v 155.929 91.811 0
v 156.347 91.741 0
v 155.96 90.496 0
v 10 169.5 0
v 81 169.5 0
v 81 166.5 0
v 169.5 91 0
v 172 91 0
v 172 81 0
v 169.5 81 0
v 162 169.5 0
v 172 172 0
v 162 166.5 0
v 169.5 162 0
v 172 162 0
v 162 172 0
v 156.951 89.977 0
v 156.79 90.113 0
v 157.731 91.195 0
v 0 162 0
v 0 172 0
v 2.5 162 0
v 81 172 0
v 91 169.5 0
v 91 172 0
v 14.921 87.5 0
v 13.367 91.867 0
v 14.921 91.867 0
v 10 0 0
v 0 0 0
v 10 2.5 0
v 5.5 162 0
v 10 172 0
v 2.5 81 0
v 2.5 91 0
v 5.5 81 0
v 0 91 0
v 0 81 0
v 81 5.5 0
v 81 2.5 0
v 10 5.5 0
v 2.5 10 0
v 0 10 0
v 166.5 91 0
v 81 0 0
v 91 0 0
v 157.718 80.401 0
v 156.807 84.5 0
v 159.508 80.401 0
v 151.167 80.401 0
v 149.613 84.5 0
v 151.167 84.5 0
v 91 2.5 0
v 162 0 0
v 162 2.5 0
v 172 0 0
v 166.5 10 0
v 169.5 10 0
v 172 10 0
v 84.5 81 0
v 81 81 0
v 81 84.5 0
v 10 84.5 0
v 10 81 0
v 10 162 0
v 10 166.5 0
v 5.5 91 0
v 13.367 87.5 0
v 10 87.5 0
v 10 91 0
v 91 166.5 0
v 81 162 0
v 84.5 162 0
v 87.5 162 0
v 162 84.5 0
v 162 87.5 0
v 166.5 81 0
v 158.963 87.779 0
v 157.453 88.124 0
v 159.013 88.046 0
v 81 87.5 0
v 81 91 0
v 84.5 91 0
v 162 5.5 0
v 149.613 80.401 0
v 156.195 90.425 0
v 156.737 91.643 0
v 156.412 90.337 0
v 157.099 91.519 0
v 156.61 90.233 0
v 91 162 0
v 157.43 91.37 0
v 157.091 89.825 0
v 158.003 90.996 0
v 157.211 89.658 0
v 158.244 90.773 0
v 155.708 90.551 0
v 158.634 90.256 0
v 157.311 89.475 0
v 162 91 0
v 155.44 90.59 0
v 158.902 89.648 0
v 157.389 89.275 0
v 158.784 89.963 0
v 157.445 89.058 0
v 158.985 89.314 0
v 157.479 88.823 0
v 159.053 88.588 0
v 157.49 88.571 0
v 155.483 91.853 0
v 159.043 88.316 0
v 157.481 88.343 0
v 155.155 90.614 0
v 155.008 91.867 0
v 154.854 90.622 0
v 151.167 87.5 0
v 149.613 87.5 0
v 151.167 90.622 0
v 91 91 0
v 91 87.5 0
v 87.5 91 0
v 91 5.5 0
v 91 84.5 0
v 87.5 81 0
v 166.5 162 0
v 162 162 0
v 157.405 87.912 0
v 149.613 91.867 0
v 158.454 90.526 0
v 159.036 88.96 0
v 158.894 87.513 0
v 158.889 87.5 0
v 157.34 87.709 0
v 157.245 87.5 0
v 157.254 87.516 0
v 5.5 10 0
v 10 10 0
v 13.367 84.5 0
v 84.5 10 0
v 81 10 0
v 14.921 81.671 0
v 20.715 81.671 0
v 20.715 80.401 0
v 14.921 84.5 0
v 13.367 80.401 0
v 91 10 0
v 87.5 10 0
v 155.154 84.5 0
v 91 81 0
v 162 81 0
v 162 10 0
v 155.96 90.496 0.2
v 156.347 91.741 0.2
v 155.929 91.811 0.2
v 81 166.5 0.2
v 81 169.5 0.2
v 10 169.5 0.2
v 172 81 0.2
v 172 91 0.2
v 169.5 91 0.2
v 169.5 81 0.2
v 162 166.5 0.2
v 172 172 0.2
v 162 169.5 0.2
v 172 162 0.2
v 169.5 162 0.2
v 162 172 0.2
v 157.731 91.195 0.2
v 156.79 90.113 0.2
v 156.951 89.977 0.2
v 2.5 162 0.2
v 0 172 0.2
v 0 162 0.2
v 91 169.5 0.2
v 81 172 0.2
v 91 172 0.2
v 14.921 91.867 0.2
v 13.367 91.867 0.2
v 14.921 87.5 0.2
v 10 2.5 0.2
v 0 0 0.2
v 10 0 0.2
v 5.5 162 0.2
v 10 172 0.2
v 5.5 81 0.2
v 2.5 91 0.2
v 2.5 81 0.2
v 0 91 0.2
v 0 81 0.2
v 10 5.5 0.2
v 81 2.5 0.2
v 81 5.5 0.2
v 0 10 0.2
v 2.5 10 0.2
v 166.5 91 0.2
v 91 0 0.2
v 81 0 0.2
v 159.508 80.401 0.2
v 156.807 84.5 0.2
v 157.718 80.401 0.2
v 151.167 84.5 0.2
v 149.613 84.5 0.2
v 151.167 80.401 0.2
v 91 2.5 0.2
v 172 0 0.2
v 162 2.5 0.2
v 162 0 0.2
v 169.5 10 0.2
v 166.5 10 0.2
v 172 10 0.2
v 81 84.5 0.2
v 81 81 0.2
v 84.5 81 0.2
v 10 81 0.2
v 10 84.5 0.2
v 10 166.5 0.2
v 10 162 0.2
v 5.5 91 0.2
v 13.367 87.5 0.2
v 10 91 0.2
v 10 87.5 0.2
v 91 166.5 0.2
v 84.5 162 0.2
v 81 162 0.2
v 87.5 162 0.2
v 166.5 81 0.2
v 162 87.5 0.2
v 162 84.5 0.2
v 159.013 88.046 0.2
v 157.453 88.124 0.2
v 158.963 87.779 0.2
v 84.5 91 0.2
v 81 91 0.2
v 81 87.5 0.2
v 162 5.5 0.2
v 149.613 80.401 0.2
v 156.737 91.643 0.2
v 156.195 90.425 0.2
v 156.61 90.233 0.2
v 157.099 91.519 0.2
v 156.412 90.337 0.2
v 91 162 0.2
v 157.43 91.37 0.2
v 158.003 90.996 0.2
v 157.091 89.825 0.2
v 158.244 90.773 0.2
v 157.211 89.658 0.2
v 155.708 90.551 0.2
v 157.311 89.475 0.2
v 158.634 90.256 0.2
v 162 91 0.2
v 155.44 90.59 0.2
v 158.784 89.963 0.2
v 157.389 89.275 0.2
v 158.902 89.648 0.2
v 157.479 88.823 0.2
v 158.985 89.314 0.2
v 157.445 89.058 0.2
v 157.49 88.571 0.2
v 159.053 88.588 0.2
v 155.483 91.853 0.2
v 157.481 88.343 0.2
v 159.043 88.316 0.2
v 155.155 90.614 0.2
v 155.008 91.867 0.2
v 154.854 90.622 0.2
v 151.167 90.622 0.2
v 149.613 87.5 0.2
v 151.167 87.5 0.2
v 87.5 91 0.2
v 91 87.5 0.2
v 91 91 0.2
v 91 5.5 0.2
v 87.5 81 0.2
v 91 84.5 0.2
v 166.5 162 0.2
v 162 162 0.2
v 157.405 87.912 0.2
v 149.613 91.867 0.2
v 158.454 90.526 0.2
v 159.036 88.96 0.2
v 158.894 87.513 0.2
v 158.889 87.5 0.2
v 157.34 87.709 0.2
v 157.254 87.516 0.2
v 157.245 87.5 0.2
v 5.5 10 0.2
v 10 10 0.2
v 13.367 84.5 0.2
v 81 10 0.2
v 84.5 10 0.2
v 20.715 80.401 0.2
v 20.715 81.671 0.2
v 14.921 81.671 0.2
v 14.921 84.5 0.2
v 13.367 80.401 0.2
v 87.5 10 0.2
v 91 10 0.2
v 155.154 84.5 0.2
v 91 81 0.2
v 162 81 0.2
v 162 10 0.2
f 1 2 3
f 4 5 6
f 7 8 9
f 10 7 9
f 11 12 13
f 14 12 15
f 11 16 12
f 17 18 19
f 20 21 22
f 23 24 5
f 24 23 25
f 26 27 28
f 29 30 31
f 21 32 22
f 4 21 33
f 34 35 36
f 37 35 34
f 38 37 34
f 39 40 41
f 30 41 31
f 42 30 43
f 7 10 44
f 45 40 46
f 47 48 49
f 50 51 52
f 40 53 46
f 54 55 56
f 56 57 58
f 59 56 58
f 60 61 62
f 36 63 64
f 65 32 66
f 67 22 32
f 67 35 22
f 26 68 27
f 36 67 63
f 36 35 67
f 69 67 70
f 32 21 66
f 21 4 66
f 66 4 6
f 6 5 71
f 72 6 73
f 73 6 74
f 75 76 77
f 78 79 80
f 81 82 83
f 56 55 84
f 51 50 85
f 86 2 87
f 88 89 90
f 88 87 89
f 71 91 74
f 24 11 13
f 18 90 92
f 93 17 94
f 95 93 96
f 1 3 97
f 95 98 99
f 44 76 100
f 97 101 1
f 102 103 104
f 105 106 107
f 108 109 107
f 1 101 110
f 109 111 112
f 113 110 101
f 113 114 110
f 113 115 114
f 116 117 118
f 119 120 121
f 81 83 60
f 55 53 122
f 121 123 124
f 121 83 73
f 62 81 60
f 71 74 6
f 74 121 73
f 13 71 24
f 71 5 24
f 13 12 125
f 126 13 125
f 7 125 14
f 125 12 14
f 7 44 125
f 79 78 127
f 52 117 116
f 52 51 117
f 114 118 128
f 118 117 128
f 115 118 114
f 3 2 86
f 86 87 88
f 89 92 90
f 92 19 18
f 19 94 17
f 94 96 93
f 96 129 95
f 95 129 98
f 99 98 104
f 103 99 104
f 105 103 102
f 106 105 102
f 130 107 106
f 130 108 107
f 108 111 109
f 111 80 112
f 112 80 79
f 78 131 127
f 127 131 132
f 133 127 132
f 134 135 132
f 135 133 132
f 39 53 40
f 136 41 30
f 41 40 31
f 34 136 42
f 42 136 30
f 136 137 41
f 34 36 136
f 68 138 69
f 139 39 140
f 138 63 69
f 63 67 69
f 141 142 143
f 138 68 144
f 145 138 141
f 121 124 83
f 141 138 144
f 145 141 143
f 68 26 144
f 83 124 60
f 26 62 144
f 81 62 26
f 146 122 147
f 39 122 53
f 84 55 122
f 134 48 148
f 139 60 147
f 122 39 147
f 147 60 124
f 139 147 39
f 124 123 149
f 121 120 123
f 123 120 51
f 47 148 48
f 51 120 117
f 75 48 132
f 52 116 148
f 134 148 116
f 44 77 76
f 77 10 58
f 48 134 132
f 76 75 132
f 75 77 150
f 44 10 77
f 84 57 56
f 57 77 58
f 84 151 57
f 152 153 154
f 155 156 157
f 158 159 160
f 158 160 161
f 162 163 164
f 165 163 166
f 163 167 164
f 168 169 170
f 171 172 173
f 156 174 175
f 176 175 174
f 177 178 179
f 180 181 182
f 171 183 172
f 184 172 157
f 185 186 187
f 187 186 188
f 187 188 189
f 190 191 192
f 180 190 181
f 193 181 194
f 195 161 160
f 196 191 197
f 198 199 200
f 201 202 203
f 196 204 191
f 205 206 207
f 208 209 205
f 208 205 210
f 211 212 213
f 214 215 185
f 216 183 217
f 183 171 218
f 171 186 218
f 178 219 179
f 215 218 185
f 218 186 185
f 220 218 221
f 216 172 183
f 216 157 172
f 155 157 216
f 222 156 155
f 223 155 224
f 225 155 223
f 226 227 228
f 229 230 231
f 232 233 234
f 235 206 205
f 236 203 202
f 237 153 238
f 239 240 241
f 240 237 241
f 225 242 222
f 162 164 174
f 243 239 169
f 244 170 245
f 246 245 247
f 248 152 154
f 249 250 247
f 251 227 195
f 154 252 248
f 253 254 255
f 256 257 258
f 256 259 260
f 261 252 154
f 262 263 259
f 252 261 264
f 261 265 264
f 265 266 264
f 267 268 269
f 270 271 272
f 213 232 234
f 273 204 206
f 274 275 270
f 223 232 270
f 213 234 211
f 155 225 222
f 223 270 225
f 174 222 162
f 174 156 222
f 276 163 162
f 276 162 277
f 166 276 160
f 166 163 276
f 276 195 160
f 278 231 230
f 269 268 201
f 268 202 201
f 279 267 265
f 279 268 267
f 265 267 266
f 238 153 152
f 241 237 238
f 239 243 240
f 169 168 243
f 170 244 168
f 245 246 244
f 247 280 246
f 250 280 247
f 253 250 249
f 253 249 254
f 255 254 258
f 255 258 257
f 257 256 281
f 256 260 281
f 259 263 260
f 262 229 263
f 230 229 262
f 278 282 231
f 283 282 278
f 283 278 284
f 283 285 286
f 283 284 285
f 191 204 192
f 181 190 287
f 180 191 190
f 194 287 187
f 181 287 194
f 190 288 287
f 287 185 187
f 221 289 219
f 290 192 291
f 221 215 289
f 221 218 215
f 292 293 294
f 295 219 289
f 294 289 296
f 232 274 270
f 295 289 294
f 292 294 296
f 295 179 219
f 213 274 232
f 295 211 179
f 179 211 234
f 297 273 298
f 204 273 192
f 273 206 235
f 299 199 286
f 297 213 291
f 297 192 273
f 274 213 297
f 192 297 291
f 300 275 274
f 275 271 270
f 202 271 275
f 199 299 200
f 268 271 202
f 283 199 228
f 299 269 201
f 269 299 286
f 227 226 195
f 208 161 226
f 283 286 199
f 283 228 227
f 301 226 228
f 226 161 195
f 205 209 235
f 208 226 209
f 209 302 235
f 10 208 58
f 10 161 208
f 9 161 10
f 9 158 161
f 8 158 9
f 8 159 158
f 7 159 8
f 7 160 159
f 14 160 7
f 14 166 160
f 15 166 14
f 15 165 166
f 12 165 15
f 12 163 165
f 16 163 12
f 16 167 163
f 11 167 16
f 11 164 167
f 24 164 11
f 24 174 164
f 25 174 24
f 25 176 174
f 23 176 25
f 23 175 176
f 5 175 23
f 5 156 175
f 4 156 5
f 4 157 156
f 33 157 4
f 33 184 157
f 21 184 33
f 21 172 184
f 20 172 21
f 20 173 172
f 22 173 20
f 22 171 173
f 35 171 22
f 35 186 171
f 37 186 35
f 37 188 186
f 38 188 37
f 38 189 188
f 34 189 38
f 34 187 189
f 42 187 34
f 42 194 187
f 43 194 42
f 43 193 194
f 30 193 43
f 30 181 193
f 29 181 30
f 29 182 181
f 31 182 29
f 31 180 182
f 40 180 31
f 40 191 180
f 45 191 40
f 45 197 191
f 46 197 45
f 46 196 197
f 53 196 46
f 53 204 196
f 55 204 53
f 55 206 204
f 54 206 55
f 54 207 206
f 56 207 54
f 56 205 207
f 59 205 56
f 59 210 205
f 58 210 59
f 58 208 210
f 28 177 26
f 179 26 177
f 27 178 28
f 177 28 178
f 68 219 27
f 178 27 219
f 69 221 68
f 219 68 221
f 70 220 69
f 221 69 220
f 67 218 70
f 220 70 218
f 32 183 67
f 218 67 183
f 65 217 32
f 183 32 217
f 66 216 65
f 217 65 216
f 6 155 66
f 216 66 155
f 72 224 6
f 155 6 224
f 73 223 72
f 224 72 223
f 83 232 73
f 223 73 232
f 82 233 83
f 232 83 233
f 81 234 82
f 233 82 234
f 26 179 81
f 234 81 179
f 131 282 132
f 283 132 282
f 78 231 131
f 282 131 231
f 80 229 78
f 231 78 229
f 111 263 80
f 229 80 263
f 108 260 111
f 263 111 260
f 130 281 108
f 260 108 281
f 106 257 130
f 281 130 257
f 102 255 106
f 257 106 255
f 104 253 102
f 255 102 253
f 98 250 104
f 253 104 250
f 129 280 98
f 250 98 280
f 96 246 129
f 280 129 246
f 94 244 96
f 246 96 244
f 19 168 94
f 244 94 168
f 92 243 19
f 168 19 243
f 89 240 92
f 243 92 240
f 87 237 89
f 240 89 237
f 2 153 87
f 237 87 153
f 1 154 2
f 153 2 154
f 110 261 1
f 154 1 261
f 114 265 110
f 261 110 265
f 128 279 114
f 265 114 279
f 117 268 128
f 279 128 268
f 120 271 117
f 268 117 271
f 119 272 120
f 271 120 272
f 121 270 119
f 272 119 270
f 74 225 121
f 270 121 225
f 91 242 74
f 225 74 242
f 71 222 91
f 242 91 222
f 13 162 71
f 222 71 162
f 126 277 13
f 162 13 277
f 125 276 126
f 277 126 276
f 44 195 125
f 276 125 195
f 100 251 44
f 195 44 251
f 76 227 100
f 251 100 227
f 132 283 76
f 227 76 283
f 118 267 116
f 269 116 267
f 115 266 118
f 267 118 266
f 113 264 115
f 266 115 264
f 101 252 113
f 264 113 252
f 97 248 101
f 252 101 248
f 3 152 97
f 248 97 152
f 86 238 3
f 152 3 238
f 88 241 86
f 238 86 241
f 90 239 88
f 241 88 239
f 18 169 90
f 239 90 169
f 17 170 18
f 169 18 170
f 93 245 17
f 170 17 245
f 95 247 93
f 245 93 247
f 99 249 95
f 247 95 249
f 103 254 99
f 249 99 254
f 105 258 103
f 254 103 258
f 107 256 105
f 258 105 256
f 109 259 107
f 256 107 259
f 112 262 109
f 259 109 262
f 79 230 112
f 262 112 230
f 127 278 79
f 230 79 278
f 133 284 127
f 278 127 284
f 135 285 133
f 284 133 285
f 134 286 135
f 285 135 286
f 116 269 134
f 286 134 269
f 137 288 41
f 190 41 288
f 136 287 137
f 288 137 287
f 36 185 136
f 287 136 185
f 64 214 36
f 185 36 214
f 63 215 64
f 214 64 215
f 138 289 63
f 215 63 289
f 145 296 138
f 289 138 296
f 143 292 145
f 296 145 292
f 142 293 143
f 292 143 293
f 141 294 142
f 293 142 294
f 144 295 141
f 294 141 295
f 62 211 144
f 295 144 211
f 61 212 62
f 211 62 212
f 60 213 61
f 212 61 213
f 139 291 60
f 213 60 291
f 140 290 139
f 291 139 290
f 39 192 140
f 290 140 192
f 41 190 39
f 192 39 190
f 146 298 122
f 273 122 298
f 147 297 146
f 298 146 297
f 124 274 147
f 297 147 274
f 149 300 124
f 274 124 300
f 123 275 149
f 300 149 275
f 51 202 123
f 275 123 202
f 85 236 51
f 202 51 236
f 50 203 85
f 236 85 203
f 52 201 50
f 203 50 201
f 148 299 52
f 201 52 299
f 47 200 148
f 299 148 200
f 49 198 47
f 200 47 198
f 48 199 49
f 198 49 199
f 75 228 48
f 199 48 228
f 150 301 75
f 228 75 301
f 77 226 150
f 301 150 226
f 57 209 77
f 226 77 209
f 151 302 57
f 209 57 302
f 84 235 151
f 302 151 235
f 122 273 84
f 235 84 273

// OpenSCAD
x_size = 172;
y_size = 172;
x_count = 3;
y_count = 3;
size = 10;
connection = 3;
shift = size / 4;
height = 0.2;

function get_base_offset(total_width, object_width, object_count) =
    (total_width - object_width) / (object_count - 1);

linear_extrude(height) {
    let (
            x_offset = get_base_offset(x_size, size, x_count),
            y_offset = get_base_offset(y_size, size, y_count)
    ) for (x = [0:x_count-1]) {
        for (y = [0:y_count-1]) {
            translate([x * x_offset, y * y_offset]) square([size, size]);
        }
    }
    let (x_offset = get_base_offset(x_size - 2*shift, connection, x_count)) for (x = [0:x_count-1]) {
        translate([shift + x*x_offset, 0]) square([connection, y_size]);
    }
    let (y_offset = get_base_offset(y_size - 2*shift, connection, y_count)) for (y = [0:y_count-1]) {
        translate([0, shift + y*y_offset, 0]) square([x_size, connection]);
    }
    translate([1.2*size, y_size / 2]) text("L", size = size*1.2, halign="left", valign="center");
    translate([x_size - 1.2*size, y_size / 2]) text("R", size = size*1.2, halign="right", valign="center");
}
